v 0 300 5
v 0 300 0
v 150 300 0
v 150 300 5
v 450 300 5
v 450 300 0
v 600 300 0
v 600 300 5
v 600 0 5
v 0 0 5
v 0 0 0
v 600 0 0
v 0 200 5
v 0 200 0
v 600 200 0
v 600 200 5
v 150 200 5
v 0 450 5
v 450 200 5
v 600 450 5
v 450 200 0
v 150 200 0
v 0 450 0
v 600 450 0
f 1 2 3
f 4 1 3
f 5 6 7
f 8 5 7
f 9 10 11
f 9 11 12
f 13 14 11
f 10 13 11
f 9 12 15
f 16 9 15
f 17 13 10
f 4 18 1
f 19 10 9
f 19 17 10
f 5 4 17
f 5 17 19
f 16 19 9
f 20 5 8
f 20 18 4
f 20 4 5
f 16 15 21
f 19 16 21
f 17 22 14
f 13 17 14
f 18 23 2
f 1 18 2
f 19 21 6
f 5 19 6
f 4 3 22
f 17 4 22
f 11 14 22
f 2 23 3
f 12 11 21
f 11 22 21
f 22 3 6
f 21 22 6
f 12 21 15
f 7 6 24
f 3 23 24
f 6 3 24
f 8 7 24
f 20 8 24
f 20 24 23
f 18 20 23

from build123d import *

# Parameters (mm, degrees)
F1_DEPTH = 5
F2_W     = 635.918021
F2_H     = 207.585454
F3_DEPTH = 25


with BuildPart() as f1:
    # F0 (on Top) → F1 (new body)
    with BuildSketch(Plane.XY):
        Polygon((0, 200), (0, 0), (600, 0), (600, 200), (450, 200), (450, 300), (600, 300), (600, 450), (0, 450), (0, 300), (150, 300), (150, 200), align=None)
        Polygon((600, 0), (0, 0), (150, -200), (450, -200), align=None)
    extrude(amount=F1_DEPTH)

    # F2 (on face) → F3 (cut)
    with BuildSketch(Plane.XY.offset(5)):
        with Locations((317.95901, -103.792727)):
            Rectangle(F2_W, F2_H)
    extrude(amount=-F3_DEPTH, mode=Mode.SUBTRACT)


solid = f1.part
